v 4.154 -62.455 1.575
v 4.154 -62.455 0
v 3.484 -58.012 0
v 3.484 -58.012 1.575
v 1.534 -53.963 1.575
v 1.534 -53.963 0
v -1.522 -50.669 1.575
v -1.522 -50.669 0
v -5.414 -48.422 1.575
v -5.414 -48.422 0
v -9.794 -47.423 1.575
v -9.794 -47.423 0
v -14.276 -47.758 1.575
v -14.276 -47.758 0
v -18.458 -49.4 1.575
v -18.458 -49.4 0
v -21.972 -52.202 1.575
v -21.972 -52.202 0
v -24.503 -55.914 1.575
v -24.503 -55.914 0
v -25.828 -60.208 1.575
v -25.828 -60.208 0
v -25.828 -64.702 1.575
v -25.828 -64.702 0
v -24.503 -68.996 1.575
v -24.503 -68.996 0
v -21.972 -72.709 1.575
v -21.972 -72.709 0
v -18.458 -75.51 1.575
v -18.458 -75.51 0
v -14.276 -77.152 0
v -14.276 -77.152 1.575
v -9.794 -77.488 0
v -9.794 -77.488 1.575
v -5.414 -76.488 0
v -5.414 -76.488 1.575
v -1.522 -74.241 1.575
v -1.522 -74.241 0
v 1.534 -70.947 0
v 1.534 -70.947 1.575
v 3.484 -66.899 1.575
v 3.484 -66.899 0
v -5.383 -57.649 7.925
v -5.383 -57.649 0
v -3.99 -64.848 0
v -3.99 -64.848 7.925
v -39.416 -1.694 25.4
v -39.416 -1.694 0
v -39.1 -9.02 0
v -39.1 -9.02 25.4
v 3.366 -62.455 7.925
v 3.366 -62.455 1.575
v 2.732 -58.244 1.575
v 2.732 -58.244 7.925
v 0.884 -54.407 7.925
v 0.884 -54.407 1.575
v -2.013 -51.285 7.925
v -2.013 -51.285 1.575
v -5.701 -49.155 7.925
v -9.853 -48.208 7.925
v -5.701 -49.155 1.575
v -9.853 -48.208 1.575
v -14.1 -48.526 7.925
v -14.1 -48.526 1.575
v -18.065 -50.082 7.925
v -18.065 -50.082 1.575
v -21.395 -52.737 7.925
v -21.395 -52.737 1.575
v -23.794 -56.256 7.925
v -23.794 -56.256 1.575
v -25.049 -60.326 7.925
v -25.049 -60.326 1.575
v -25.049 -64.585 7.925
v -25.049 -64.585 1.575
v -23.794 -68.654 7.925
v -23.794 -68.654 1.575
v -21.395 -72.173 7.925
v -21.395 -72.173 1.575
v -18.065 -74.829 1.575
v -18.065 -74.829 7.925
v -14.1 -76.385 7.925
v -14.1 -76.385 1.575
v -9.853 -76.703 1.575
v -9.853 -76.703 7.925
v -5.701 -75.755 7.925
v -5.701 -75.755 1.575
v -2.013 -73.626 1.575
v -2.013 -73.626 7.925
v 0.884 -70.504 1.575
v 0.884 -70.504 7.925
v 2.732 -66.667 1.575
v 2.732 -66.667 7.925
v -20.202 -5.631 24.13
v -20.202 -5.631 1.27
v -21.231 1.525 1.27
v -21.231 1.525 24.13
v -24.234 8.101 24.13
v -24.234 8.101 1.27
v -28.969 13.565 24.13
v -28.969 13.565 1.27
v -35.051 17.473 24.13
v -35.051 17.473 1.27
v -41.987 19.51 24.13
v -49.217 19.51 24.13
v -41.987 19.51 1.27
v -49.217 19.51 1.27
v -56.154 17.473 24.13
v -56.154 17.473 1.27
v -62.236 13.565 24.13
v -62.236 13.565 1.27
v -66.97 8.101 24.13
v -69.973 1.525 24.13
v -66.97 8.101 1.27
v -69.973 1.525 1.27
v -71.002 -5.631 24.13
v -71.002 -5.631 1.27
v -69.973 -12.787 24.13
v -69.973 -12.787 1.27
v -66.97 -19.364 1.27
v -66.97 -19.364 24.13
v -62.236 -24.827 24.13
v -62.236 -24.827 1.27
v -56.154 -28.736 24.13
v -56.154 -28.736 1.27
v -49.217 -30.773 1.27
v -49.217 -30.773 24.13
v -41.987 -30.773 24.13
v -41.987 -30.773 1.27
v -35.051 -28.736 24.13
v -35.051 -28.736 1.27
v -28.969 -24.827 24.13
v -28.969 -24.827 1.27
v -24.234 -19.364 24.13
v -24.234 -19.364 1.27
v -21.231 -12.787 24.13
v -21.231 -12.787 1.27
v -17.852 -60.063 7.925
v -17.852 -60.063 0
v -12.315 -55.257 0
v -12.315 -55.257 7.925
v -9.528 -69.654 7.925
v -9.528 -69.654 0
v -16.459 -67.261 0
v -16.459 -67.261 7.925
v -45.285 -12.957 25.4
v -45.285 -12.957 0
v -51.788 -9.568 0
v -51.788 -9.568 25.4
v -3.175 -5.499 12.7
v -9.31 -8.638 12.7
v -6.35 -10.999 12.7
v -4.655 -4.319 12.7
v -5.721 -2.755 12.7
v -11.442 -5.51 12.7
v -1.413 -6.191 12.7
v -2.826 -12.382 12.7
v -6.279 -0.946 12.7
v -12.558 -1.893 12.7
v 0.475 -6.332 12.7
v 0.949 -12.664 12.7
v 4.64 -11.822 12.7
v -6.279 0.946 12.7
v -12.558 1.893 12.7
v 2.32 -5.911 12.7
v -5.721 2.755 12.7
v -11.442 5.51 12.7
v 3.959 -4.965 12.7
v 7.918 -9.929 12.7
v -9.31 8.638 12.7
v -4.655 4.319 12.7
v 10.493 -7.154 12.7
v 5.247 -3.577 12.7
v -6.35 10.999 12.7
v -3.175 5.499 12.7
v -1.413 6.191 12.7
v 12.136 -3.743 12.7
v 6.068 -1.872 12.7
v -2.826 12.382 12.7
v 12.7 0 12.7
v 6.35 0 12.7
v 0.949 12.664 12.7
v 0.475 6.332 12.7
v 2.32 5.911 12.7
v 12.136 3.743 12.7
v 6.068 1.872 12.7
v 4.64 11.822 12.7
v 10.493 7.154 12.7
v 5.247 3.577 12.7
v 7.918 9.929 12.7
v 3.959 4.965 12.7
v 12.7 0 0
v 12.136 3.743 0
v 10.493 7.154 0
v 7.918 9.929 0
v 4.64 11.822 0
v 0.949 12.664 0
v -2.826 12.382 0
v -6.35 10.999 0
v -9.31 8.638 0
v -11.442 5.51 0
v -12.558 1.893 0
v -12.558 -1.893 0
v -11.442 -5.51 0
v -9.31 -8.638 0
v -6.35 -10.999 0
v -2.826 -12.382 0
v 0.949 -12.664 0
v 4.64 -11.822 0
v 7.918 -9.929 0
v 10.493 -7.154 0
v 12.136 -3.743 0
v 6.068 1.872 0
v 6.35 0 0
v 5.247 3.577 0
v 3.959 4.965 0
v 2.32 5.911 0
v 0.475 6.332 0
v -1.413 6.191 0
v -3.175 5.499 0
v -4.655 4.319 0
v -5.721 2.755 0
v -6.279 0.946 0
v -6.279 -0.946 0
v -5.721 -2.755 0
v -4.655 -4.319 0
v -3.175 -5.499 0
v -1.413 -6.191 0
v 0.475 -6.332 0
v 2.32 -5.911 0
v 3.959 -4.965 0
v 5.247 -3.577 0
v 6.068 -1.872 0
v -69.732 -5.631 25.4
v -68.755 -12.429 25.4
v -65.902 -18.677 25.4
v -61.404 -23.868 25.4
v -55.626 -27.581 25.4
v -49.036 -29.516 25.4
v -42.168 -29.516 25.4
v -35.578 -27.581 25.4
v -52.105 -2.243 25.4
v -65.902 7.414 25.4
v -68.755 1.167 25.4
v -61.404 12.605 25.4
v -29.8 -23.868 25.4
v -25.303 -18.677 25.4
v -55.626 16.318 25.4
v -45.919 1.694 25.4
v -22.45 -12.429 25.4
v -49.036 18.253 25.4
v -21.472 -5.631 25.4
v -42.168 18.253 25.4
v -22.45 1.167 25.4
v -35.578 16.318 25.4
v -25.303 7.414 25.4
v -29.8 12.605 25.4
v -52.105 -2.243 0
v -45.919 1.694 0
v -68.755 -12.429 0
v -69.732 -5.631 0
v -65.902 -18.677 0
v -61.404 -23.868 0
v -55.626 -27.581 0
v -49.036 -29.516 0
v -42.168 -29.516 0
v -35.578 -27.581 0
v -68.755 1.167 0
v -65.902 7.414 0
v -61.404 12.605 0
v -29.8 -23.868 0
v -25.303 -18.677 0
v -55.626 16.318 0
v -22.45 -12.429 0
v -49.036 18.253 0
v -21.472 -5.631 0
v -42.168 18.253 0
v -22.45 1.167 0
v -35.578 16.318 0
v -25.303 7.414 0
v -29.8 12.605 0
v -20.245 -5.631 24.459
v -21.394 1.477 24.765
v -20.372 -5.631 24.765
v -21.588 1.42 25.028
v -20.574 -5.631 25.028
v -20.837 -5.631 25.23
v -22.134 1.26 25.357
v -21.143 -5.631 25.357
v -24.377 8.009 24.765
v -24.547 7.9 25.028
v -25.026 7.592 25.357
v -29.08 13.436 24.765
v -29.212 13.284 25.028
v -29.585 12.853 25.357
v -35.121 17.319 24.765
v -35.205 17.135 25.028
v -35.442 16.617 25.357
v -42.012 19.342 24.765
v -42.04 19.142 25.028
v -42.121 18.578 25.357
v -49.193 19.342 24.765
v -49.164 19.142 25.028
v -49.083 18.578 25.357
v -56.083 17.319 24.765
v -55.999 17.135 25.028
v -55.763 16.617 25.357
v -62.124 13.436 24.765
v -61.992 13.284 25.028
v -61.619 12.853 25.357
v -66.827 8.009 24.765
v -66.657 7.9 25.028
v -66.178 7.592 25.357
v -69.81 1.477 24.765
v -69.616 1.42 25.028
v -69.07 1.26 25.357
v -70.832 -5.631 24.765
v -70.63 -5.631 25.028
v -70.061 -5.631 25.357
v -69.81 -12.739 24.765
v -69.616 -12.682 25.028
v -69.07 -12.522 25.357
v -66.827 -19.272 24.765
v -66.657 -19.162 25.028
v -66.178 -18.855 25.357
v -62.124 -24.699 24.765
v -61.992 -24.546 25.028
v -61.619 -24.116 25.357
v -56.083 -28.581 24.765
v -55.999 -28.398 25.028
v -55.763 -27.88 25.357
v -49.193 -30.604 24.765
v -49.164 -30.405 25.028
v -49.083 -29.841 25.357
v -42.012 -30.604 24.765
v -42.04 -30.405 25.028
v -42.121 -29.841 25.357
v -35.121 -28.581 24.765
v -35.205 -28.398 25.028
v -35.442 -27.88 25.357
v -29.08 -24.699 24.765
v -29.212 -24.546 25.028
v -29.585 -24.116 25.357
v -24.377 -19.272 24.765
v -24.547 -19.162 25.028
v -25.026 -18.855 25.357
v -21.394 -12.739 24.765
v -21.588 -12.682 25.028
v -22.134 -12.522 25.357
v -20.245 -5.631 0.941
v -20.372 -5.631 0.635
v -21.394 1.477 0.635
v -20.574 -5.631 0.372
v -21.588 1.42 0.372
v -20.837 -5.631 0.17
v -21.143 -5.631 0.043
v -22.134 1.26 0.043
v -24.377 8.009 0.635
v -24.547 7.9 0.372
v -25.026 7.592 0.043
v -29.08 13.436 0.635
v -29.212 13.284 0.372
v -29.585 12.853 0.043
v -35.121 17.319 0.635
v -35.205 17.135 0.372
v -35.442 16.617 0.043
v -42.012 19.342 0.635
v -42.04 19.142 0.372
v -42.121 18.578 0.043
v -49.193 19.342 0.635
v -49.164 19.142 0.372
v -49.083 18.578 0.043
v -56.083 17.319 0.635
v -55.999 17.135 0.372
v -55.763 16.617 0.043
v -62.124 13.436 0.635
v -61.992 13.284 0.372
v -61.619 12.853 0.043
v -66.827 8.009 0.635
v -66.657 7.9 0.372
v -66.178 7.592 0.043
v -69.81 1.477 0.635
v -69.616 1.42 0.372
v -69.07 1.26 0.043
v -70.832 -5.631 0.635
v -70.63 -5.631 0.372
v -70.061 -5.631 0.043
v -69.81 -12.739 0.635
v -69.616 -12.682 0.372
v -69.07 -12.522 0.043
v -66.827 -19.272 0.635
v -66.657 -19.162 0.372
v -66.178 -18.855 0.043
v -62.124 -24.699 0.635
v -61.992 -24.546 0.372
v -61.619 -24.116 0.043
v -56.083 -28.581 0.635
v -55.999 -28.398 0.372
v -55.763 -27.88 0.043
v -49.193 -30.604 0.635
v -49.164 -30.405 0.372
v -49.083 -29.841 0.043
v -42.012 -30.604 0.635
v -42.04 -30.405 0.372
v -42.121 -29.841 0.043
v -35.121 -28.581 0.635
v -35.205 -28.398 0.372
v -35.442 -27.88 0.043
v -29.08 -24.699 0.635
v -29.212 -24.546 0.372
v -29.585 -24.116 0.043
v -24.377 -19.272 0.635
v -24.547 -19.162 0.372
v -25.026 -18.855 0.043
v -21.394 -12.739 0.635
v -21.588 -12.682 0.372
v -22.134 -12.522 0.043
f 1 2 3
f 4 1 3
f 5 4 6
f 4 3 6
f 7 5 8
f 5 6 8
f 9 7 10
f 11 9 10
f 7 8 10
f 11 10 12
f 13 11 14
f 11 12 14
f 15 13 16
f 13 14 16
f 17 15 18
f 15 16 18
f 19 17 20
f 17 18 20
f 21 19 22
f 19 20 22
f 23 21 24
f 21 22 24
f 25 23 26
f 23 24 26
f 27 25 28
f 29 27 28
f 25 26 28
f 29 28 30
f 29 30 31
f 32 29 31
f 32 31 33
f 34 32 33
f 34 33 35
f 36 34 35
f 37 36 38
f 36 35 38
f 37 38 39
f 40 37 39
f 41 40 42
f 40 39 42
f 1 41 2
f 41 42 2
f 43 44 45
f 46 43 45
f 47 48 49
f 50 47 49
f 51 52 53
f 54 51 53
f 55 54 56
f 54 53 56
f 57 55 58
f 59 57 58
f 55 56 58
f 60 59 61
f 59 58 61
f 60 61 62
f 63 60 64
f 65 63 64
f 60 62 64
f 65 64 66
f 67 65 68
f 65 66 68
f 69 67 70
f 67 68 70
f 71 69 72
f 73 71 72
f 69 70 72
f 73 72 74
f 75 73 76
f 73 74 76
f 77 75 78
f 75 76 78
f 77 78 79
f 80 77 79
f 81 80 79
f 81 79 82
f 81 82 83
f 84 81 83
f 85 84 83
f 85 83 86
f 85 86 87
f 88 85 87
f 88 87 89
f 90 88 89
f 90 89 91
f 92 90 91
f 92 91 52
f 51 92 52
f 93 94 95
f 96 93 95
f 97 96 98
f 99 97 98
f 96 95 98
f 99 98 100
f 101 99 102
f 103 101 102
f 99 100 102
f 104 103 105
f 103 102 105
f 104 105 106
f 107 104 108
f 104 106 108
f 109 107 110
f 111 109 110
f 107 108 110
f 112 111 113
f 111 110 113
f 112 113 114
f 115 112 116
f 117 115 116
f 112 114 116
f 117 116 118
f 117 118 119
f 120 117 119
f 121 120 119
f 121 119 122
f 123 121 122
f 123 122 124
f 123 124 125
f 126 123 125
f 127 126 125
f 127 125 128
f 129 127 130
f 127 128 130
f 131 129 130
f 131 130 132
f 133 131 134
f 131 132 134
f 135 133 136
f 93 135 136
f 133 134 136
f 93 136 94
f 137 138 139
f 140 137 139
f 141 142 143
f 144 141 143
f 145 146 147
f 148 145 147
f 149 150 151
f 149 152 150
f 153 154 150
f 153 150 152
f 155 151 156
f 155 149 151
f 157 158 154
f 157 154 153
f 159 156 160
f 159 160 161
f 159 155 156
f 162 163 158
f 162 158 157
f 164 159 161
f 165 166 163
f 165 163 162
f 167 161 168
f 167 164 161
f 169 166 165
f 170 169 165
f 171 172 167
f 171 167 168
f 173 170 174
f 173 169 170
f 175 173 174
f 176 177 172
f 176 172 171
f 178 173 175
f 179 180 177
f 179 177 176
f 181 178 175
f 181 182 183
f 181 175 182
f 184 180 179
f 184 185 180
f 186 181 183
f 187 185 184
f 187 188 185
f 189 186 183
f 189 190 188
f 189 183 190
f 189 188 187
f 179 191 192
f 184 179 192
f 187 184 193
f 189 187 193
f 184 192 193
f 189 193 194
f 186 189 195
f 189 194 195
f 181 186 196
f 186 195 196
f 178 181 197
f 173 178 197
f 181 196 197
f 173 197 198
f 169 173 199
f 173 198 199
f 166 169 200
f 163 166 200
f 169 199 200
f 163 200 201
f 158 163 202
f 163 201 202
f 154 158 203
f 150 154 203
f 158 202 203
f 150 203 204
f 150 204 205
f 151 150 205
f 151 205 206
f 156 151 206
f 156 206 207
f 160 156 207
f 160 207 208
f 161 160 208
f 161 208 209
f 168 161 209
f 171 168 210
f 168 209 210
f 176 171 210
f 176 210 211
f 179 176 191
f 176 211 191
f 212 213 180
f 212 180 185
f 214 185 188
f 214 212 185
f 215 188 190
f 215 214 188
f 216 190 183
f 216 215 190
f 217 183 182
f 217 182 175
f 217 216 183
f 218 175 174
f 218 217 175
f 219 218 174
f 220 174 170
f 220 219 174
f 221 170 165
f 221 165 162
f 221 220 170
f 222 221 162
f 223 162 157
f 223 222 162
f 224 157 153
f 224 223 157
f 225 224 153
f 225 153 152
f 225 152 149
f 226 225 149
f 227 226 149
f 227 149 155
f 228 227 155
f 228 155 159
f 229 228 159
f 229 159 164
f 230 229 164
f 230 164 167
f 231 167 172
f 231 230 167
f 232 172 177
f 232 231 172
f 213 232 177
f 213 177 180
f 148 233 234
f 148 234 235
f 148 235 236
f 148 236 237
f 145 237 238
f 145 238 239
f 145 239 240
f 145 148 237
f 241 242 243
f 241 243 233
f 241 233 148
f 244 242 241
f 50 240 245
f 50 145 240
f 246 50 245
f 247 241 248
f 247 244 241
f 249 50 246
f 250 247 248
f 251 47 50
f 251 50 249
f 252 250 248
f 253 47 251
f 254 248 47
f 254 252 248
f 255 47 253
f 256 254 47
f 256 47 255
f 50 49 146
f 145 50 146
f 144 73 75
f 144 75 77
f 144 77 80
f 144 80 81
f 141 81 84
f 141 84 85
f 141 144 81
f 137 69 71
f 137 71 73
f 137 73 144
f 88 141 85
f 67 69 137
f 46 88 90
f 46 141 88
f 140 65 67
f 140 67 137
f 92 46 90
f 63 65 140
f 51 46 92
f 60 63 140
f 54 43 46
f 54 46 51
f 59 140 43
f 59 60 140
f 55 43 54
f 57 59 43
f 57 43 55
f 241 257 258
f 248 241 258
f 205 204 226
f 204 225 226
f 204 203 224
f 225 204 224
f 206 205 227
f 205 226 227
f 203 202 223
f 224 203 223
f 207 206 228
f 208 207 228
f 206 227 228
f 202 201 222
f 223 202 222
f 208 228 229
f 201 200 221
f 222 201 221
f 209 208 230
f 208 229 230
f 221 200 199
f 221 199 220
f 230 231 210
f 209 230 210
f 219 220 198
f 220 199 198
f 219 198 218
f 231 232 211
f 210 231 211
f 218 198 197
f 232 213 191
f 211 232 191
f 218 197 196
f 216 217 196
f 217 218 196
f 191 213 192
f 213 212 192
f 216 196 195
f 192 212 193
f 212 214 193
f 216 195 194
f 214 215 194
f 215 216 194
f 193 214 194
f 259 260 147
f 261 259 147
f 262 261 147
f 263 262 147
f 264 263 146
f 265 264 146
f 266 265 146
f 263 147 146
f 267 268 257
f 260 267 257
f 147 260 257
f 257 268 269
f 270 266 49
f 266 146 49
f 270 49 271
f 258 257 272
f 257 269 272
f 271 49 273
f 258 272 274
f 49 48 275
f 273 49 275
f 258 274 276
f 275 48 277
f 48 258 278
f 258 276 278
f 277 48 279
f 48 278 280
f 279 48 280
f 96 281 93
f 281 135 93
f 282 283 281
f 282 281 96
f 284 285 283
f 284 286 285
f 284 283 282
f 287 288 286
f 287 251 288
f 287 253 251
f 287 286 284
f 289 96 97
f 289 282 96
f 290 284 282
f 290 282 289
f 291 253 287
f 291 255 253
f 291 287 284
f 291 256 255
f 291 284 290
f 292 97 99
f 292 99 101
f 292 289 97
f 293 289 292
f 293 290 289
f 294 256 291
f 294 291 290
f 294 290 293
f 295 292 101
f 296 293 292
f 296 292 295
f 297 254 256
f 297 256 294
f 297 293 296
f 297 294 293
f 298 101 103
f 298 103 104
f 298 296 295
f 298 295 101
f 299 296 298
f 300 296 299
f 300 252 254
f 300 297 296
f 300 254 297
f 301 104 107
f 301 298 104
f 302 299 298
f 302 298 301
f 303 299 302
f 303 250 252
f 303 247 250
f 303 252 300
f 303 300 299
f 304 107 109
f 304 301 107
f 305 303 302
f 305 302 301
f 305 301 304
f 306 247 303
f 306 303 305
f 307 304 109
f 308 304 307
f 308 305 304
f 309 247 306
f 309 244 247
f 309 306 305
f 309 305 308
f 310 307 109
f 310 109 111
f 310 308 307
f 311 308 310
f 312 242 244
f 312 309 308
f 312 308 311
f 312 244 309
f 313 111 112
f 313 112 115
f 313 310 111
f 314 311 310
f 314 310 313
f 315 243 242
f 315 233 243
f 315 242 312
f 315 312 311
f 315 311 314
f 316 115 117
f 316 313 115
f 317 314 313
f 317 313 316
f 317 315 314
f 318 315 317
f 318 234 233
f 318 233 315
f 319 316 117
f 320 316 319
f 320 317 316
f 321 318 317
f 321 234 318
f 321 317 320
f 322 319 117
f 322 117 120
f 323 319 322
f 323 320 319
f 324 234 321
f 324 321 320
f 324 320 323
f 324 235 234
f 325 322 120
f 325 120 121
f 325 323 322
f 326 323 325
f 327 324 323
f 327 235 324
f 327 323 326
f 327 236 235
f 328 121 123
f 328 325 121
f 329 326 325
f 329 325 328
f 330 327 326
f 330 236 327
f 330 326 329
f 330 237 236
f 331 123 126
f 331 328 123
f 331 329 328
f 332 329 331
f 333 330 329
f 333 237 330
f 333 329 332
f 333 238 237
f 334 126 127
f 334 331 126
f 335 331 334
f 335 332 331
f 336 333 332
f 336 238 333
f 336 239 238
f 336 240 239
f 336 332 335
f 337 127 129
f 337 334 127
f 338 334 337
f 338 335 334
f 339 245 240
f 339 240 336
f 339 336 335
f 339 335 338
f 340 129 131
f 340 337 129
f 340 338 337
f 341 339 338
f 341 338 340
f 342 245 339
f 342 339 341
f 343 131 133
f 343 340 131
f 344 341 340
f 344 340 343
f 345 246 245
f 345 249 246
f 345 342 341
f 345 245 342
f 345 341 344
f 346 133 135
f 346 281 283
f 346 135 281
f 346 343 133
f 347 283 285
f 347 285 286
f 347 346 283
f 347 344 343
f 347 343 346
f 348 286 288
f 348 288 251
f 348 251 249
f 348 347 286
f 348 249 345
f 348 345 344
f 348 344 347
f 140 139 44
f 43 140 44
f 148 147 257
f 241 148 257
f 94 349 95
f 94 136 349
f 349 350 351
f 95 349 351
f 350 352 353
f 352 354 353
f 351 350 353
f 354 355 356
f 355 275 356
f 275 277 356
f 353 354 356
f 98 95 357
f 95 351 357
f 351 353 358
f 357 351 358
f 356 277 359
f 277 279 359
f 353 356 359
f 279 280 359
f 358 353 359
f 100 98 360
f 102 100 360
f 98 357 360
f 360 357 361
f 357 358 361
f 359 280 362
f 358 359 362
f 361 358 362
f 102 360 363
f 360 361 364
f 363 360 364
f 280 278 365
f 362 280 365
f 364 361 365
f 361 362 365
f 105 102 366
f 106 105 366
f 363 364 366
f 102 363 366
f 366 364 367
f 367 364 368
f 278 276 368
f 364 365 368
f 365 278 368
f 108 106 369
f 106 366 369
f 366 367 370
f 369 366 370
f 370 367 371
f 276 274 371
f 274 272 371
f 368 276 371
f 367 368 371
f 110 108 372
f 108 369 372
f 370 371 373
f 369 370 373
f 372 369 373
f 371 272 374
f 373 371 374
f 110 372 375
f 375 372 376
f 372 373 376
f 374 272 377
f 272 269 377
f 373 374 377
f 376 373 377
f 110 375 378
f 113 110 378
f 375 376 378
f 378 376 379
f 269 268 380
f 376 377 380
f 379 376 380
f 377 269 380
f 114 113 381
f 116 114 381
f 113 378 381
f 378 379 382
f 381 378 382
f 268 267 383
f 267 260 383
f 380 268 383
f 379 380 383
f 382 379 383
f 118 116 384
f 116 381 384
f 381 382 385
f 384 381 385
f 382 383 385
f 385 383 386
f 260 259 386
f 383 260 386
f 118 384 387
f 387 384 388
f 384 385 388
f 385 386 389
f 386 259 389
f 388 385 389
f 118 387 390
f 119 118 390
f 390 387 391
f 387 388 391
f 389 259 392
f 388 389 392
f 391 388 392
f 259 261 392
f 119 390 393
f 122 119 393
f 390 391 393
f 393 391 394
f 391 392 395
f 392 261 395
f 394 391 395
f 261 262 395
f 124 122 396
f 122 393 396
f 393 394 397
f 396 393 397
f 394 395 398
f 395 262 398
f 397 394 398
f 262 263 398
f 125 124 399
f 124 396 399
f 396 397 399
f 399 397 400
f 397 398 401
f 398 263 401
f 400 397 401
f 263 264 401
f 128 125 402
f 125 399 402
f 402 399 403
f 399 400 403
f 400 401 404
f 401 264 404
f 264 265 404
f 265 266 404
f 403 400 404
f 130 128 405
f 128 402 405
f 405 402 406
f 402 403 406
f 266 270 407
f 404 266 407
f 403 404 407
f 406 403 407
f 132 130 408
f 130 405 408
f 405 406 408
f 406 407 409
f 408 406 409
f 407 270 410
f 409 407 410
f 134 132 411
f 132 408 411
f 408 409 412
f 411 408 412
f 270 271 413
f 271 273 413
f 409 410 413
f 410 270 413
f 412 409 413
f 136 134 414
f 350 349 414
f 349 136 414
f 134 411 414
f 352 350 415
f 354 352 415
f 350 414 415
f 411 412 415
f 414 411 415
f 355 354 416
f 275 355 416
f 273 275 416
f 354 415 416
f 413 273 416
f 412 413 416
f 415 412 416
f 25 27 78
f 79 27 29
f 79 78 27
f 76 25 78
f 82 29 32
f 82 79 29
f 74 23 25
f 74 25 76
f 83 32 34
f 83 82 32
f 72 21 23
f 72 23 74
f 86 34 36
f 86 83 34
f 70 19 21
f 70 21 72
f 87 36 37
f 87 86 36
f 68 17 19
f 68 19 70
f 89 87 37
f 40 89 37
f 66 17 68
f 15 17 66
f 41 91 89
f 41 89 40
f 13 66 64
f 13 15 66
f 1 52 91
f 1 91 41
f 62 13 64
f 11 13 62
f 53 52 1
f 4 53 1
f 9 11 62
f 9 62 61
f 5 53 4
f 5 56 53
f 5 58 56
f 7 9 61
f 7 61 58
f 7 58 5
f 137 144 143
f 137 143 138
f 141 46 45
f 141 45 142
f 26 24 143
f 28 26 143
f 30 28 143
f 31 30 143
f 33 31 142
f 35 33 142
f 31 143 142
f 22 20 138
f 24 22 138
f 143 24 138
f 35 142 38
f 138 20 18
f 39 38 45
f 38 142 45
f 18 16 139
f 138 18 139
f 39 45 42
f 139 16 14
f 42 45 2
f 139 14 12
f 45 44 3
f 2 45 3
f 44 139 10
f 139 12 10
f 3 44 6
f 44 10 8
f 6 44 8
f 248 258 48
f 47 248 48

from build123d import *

# Parameters (mm, degrees)
F0_R     = 12.7
F0_R_2   = 6.35
F1_DEPTH = 12.7
F2_R     = 25.4
F3_DEPTH = 25.4
F4_R     = 1.27
F5_R     = 14.2875
F6_DEPTH = 7.9248
F5_R_2   = 15.0749
F7_DEPTH = 1.5748


with BuildPart() as f1:
    # F0 (on Top) → F1 (new body)
    with BuildSketch(Plane.XY):
        Circle(F0_R)
        Circle(F0_R_2, mode=Mode.SUBTRACT)
    extrude(amount=F1_DEPTH)


with BuildPart() as f3:
    # F2 (on Top) → F3 (new body)
    with BuildSketch(Plane.XY):
        with Locations((-45.6022, -5.631276)):
            Circle(F2_R)
        Polygon((-52.104637, -2.242818), (-45.918928, 1.694229), (-39.416491, -1.694229), (-39.099763, -9.019733), (-45.285472, -12.95678), (-51.787909, -9.568323), align=None, mode=Mode.SUBTRACT)
    extrude(amount=F3_DEPTH)

    # F4
    f4_edges = [f3.edges().sort_by_distance(p)[0] for p in [
        (-71.0022, -5.631276, 25.4),
        (-71.0022, -5.631276, 0),
    ]]
    fillet(f4_edges, radius=F4_R)


with BuildPart() as f6:
    # F5 (on Top) → F6 (new body)
    with BuildSketch(Plane.XY):
        with Locations((-10.921034, -62.455252)):
            Circle(F5_R)
        Polygon((-17.852044, -60.062671), (-12.314503, -55.256531), (-5.383494, -57.649112), (-3.990025, -64.847832), (-9.527565, -69.653972), (-16.458574, -67.261392), align=None, mode=Mode.SUBTRACT)
    extrude(amount=F6_DEPTH)

    # F5 (on Top) → F7 (join)
    with BuildSketch(Plane.XY):
        with Locations((-10.921034, -62.455252)):
            Circle(F5_R_2)
        with Locations((-10.921034, -62.455252)):
            Circle(F5_R, mode=Mode.SUBTRACT)
    extrude(amount=F7_DEPTH)


solid = Compound([f1.part, f3.part, f6.part])
